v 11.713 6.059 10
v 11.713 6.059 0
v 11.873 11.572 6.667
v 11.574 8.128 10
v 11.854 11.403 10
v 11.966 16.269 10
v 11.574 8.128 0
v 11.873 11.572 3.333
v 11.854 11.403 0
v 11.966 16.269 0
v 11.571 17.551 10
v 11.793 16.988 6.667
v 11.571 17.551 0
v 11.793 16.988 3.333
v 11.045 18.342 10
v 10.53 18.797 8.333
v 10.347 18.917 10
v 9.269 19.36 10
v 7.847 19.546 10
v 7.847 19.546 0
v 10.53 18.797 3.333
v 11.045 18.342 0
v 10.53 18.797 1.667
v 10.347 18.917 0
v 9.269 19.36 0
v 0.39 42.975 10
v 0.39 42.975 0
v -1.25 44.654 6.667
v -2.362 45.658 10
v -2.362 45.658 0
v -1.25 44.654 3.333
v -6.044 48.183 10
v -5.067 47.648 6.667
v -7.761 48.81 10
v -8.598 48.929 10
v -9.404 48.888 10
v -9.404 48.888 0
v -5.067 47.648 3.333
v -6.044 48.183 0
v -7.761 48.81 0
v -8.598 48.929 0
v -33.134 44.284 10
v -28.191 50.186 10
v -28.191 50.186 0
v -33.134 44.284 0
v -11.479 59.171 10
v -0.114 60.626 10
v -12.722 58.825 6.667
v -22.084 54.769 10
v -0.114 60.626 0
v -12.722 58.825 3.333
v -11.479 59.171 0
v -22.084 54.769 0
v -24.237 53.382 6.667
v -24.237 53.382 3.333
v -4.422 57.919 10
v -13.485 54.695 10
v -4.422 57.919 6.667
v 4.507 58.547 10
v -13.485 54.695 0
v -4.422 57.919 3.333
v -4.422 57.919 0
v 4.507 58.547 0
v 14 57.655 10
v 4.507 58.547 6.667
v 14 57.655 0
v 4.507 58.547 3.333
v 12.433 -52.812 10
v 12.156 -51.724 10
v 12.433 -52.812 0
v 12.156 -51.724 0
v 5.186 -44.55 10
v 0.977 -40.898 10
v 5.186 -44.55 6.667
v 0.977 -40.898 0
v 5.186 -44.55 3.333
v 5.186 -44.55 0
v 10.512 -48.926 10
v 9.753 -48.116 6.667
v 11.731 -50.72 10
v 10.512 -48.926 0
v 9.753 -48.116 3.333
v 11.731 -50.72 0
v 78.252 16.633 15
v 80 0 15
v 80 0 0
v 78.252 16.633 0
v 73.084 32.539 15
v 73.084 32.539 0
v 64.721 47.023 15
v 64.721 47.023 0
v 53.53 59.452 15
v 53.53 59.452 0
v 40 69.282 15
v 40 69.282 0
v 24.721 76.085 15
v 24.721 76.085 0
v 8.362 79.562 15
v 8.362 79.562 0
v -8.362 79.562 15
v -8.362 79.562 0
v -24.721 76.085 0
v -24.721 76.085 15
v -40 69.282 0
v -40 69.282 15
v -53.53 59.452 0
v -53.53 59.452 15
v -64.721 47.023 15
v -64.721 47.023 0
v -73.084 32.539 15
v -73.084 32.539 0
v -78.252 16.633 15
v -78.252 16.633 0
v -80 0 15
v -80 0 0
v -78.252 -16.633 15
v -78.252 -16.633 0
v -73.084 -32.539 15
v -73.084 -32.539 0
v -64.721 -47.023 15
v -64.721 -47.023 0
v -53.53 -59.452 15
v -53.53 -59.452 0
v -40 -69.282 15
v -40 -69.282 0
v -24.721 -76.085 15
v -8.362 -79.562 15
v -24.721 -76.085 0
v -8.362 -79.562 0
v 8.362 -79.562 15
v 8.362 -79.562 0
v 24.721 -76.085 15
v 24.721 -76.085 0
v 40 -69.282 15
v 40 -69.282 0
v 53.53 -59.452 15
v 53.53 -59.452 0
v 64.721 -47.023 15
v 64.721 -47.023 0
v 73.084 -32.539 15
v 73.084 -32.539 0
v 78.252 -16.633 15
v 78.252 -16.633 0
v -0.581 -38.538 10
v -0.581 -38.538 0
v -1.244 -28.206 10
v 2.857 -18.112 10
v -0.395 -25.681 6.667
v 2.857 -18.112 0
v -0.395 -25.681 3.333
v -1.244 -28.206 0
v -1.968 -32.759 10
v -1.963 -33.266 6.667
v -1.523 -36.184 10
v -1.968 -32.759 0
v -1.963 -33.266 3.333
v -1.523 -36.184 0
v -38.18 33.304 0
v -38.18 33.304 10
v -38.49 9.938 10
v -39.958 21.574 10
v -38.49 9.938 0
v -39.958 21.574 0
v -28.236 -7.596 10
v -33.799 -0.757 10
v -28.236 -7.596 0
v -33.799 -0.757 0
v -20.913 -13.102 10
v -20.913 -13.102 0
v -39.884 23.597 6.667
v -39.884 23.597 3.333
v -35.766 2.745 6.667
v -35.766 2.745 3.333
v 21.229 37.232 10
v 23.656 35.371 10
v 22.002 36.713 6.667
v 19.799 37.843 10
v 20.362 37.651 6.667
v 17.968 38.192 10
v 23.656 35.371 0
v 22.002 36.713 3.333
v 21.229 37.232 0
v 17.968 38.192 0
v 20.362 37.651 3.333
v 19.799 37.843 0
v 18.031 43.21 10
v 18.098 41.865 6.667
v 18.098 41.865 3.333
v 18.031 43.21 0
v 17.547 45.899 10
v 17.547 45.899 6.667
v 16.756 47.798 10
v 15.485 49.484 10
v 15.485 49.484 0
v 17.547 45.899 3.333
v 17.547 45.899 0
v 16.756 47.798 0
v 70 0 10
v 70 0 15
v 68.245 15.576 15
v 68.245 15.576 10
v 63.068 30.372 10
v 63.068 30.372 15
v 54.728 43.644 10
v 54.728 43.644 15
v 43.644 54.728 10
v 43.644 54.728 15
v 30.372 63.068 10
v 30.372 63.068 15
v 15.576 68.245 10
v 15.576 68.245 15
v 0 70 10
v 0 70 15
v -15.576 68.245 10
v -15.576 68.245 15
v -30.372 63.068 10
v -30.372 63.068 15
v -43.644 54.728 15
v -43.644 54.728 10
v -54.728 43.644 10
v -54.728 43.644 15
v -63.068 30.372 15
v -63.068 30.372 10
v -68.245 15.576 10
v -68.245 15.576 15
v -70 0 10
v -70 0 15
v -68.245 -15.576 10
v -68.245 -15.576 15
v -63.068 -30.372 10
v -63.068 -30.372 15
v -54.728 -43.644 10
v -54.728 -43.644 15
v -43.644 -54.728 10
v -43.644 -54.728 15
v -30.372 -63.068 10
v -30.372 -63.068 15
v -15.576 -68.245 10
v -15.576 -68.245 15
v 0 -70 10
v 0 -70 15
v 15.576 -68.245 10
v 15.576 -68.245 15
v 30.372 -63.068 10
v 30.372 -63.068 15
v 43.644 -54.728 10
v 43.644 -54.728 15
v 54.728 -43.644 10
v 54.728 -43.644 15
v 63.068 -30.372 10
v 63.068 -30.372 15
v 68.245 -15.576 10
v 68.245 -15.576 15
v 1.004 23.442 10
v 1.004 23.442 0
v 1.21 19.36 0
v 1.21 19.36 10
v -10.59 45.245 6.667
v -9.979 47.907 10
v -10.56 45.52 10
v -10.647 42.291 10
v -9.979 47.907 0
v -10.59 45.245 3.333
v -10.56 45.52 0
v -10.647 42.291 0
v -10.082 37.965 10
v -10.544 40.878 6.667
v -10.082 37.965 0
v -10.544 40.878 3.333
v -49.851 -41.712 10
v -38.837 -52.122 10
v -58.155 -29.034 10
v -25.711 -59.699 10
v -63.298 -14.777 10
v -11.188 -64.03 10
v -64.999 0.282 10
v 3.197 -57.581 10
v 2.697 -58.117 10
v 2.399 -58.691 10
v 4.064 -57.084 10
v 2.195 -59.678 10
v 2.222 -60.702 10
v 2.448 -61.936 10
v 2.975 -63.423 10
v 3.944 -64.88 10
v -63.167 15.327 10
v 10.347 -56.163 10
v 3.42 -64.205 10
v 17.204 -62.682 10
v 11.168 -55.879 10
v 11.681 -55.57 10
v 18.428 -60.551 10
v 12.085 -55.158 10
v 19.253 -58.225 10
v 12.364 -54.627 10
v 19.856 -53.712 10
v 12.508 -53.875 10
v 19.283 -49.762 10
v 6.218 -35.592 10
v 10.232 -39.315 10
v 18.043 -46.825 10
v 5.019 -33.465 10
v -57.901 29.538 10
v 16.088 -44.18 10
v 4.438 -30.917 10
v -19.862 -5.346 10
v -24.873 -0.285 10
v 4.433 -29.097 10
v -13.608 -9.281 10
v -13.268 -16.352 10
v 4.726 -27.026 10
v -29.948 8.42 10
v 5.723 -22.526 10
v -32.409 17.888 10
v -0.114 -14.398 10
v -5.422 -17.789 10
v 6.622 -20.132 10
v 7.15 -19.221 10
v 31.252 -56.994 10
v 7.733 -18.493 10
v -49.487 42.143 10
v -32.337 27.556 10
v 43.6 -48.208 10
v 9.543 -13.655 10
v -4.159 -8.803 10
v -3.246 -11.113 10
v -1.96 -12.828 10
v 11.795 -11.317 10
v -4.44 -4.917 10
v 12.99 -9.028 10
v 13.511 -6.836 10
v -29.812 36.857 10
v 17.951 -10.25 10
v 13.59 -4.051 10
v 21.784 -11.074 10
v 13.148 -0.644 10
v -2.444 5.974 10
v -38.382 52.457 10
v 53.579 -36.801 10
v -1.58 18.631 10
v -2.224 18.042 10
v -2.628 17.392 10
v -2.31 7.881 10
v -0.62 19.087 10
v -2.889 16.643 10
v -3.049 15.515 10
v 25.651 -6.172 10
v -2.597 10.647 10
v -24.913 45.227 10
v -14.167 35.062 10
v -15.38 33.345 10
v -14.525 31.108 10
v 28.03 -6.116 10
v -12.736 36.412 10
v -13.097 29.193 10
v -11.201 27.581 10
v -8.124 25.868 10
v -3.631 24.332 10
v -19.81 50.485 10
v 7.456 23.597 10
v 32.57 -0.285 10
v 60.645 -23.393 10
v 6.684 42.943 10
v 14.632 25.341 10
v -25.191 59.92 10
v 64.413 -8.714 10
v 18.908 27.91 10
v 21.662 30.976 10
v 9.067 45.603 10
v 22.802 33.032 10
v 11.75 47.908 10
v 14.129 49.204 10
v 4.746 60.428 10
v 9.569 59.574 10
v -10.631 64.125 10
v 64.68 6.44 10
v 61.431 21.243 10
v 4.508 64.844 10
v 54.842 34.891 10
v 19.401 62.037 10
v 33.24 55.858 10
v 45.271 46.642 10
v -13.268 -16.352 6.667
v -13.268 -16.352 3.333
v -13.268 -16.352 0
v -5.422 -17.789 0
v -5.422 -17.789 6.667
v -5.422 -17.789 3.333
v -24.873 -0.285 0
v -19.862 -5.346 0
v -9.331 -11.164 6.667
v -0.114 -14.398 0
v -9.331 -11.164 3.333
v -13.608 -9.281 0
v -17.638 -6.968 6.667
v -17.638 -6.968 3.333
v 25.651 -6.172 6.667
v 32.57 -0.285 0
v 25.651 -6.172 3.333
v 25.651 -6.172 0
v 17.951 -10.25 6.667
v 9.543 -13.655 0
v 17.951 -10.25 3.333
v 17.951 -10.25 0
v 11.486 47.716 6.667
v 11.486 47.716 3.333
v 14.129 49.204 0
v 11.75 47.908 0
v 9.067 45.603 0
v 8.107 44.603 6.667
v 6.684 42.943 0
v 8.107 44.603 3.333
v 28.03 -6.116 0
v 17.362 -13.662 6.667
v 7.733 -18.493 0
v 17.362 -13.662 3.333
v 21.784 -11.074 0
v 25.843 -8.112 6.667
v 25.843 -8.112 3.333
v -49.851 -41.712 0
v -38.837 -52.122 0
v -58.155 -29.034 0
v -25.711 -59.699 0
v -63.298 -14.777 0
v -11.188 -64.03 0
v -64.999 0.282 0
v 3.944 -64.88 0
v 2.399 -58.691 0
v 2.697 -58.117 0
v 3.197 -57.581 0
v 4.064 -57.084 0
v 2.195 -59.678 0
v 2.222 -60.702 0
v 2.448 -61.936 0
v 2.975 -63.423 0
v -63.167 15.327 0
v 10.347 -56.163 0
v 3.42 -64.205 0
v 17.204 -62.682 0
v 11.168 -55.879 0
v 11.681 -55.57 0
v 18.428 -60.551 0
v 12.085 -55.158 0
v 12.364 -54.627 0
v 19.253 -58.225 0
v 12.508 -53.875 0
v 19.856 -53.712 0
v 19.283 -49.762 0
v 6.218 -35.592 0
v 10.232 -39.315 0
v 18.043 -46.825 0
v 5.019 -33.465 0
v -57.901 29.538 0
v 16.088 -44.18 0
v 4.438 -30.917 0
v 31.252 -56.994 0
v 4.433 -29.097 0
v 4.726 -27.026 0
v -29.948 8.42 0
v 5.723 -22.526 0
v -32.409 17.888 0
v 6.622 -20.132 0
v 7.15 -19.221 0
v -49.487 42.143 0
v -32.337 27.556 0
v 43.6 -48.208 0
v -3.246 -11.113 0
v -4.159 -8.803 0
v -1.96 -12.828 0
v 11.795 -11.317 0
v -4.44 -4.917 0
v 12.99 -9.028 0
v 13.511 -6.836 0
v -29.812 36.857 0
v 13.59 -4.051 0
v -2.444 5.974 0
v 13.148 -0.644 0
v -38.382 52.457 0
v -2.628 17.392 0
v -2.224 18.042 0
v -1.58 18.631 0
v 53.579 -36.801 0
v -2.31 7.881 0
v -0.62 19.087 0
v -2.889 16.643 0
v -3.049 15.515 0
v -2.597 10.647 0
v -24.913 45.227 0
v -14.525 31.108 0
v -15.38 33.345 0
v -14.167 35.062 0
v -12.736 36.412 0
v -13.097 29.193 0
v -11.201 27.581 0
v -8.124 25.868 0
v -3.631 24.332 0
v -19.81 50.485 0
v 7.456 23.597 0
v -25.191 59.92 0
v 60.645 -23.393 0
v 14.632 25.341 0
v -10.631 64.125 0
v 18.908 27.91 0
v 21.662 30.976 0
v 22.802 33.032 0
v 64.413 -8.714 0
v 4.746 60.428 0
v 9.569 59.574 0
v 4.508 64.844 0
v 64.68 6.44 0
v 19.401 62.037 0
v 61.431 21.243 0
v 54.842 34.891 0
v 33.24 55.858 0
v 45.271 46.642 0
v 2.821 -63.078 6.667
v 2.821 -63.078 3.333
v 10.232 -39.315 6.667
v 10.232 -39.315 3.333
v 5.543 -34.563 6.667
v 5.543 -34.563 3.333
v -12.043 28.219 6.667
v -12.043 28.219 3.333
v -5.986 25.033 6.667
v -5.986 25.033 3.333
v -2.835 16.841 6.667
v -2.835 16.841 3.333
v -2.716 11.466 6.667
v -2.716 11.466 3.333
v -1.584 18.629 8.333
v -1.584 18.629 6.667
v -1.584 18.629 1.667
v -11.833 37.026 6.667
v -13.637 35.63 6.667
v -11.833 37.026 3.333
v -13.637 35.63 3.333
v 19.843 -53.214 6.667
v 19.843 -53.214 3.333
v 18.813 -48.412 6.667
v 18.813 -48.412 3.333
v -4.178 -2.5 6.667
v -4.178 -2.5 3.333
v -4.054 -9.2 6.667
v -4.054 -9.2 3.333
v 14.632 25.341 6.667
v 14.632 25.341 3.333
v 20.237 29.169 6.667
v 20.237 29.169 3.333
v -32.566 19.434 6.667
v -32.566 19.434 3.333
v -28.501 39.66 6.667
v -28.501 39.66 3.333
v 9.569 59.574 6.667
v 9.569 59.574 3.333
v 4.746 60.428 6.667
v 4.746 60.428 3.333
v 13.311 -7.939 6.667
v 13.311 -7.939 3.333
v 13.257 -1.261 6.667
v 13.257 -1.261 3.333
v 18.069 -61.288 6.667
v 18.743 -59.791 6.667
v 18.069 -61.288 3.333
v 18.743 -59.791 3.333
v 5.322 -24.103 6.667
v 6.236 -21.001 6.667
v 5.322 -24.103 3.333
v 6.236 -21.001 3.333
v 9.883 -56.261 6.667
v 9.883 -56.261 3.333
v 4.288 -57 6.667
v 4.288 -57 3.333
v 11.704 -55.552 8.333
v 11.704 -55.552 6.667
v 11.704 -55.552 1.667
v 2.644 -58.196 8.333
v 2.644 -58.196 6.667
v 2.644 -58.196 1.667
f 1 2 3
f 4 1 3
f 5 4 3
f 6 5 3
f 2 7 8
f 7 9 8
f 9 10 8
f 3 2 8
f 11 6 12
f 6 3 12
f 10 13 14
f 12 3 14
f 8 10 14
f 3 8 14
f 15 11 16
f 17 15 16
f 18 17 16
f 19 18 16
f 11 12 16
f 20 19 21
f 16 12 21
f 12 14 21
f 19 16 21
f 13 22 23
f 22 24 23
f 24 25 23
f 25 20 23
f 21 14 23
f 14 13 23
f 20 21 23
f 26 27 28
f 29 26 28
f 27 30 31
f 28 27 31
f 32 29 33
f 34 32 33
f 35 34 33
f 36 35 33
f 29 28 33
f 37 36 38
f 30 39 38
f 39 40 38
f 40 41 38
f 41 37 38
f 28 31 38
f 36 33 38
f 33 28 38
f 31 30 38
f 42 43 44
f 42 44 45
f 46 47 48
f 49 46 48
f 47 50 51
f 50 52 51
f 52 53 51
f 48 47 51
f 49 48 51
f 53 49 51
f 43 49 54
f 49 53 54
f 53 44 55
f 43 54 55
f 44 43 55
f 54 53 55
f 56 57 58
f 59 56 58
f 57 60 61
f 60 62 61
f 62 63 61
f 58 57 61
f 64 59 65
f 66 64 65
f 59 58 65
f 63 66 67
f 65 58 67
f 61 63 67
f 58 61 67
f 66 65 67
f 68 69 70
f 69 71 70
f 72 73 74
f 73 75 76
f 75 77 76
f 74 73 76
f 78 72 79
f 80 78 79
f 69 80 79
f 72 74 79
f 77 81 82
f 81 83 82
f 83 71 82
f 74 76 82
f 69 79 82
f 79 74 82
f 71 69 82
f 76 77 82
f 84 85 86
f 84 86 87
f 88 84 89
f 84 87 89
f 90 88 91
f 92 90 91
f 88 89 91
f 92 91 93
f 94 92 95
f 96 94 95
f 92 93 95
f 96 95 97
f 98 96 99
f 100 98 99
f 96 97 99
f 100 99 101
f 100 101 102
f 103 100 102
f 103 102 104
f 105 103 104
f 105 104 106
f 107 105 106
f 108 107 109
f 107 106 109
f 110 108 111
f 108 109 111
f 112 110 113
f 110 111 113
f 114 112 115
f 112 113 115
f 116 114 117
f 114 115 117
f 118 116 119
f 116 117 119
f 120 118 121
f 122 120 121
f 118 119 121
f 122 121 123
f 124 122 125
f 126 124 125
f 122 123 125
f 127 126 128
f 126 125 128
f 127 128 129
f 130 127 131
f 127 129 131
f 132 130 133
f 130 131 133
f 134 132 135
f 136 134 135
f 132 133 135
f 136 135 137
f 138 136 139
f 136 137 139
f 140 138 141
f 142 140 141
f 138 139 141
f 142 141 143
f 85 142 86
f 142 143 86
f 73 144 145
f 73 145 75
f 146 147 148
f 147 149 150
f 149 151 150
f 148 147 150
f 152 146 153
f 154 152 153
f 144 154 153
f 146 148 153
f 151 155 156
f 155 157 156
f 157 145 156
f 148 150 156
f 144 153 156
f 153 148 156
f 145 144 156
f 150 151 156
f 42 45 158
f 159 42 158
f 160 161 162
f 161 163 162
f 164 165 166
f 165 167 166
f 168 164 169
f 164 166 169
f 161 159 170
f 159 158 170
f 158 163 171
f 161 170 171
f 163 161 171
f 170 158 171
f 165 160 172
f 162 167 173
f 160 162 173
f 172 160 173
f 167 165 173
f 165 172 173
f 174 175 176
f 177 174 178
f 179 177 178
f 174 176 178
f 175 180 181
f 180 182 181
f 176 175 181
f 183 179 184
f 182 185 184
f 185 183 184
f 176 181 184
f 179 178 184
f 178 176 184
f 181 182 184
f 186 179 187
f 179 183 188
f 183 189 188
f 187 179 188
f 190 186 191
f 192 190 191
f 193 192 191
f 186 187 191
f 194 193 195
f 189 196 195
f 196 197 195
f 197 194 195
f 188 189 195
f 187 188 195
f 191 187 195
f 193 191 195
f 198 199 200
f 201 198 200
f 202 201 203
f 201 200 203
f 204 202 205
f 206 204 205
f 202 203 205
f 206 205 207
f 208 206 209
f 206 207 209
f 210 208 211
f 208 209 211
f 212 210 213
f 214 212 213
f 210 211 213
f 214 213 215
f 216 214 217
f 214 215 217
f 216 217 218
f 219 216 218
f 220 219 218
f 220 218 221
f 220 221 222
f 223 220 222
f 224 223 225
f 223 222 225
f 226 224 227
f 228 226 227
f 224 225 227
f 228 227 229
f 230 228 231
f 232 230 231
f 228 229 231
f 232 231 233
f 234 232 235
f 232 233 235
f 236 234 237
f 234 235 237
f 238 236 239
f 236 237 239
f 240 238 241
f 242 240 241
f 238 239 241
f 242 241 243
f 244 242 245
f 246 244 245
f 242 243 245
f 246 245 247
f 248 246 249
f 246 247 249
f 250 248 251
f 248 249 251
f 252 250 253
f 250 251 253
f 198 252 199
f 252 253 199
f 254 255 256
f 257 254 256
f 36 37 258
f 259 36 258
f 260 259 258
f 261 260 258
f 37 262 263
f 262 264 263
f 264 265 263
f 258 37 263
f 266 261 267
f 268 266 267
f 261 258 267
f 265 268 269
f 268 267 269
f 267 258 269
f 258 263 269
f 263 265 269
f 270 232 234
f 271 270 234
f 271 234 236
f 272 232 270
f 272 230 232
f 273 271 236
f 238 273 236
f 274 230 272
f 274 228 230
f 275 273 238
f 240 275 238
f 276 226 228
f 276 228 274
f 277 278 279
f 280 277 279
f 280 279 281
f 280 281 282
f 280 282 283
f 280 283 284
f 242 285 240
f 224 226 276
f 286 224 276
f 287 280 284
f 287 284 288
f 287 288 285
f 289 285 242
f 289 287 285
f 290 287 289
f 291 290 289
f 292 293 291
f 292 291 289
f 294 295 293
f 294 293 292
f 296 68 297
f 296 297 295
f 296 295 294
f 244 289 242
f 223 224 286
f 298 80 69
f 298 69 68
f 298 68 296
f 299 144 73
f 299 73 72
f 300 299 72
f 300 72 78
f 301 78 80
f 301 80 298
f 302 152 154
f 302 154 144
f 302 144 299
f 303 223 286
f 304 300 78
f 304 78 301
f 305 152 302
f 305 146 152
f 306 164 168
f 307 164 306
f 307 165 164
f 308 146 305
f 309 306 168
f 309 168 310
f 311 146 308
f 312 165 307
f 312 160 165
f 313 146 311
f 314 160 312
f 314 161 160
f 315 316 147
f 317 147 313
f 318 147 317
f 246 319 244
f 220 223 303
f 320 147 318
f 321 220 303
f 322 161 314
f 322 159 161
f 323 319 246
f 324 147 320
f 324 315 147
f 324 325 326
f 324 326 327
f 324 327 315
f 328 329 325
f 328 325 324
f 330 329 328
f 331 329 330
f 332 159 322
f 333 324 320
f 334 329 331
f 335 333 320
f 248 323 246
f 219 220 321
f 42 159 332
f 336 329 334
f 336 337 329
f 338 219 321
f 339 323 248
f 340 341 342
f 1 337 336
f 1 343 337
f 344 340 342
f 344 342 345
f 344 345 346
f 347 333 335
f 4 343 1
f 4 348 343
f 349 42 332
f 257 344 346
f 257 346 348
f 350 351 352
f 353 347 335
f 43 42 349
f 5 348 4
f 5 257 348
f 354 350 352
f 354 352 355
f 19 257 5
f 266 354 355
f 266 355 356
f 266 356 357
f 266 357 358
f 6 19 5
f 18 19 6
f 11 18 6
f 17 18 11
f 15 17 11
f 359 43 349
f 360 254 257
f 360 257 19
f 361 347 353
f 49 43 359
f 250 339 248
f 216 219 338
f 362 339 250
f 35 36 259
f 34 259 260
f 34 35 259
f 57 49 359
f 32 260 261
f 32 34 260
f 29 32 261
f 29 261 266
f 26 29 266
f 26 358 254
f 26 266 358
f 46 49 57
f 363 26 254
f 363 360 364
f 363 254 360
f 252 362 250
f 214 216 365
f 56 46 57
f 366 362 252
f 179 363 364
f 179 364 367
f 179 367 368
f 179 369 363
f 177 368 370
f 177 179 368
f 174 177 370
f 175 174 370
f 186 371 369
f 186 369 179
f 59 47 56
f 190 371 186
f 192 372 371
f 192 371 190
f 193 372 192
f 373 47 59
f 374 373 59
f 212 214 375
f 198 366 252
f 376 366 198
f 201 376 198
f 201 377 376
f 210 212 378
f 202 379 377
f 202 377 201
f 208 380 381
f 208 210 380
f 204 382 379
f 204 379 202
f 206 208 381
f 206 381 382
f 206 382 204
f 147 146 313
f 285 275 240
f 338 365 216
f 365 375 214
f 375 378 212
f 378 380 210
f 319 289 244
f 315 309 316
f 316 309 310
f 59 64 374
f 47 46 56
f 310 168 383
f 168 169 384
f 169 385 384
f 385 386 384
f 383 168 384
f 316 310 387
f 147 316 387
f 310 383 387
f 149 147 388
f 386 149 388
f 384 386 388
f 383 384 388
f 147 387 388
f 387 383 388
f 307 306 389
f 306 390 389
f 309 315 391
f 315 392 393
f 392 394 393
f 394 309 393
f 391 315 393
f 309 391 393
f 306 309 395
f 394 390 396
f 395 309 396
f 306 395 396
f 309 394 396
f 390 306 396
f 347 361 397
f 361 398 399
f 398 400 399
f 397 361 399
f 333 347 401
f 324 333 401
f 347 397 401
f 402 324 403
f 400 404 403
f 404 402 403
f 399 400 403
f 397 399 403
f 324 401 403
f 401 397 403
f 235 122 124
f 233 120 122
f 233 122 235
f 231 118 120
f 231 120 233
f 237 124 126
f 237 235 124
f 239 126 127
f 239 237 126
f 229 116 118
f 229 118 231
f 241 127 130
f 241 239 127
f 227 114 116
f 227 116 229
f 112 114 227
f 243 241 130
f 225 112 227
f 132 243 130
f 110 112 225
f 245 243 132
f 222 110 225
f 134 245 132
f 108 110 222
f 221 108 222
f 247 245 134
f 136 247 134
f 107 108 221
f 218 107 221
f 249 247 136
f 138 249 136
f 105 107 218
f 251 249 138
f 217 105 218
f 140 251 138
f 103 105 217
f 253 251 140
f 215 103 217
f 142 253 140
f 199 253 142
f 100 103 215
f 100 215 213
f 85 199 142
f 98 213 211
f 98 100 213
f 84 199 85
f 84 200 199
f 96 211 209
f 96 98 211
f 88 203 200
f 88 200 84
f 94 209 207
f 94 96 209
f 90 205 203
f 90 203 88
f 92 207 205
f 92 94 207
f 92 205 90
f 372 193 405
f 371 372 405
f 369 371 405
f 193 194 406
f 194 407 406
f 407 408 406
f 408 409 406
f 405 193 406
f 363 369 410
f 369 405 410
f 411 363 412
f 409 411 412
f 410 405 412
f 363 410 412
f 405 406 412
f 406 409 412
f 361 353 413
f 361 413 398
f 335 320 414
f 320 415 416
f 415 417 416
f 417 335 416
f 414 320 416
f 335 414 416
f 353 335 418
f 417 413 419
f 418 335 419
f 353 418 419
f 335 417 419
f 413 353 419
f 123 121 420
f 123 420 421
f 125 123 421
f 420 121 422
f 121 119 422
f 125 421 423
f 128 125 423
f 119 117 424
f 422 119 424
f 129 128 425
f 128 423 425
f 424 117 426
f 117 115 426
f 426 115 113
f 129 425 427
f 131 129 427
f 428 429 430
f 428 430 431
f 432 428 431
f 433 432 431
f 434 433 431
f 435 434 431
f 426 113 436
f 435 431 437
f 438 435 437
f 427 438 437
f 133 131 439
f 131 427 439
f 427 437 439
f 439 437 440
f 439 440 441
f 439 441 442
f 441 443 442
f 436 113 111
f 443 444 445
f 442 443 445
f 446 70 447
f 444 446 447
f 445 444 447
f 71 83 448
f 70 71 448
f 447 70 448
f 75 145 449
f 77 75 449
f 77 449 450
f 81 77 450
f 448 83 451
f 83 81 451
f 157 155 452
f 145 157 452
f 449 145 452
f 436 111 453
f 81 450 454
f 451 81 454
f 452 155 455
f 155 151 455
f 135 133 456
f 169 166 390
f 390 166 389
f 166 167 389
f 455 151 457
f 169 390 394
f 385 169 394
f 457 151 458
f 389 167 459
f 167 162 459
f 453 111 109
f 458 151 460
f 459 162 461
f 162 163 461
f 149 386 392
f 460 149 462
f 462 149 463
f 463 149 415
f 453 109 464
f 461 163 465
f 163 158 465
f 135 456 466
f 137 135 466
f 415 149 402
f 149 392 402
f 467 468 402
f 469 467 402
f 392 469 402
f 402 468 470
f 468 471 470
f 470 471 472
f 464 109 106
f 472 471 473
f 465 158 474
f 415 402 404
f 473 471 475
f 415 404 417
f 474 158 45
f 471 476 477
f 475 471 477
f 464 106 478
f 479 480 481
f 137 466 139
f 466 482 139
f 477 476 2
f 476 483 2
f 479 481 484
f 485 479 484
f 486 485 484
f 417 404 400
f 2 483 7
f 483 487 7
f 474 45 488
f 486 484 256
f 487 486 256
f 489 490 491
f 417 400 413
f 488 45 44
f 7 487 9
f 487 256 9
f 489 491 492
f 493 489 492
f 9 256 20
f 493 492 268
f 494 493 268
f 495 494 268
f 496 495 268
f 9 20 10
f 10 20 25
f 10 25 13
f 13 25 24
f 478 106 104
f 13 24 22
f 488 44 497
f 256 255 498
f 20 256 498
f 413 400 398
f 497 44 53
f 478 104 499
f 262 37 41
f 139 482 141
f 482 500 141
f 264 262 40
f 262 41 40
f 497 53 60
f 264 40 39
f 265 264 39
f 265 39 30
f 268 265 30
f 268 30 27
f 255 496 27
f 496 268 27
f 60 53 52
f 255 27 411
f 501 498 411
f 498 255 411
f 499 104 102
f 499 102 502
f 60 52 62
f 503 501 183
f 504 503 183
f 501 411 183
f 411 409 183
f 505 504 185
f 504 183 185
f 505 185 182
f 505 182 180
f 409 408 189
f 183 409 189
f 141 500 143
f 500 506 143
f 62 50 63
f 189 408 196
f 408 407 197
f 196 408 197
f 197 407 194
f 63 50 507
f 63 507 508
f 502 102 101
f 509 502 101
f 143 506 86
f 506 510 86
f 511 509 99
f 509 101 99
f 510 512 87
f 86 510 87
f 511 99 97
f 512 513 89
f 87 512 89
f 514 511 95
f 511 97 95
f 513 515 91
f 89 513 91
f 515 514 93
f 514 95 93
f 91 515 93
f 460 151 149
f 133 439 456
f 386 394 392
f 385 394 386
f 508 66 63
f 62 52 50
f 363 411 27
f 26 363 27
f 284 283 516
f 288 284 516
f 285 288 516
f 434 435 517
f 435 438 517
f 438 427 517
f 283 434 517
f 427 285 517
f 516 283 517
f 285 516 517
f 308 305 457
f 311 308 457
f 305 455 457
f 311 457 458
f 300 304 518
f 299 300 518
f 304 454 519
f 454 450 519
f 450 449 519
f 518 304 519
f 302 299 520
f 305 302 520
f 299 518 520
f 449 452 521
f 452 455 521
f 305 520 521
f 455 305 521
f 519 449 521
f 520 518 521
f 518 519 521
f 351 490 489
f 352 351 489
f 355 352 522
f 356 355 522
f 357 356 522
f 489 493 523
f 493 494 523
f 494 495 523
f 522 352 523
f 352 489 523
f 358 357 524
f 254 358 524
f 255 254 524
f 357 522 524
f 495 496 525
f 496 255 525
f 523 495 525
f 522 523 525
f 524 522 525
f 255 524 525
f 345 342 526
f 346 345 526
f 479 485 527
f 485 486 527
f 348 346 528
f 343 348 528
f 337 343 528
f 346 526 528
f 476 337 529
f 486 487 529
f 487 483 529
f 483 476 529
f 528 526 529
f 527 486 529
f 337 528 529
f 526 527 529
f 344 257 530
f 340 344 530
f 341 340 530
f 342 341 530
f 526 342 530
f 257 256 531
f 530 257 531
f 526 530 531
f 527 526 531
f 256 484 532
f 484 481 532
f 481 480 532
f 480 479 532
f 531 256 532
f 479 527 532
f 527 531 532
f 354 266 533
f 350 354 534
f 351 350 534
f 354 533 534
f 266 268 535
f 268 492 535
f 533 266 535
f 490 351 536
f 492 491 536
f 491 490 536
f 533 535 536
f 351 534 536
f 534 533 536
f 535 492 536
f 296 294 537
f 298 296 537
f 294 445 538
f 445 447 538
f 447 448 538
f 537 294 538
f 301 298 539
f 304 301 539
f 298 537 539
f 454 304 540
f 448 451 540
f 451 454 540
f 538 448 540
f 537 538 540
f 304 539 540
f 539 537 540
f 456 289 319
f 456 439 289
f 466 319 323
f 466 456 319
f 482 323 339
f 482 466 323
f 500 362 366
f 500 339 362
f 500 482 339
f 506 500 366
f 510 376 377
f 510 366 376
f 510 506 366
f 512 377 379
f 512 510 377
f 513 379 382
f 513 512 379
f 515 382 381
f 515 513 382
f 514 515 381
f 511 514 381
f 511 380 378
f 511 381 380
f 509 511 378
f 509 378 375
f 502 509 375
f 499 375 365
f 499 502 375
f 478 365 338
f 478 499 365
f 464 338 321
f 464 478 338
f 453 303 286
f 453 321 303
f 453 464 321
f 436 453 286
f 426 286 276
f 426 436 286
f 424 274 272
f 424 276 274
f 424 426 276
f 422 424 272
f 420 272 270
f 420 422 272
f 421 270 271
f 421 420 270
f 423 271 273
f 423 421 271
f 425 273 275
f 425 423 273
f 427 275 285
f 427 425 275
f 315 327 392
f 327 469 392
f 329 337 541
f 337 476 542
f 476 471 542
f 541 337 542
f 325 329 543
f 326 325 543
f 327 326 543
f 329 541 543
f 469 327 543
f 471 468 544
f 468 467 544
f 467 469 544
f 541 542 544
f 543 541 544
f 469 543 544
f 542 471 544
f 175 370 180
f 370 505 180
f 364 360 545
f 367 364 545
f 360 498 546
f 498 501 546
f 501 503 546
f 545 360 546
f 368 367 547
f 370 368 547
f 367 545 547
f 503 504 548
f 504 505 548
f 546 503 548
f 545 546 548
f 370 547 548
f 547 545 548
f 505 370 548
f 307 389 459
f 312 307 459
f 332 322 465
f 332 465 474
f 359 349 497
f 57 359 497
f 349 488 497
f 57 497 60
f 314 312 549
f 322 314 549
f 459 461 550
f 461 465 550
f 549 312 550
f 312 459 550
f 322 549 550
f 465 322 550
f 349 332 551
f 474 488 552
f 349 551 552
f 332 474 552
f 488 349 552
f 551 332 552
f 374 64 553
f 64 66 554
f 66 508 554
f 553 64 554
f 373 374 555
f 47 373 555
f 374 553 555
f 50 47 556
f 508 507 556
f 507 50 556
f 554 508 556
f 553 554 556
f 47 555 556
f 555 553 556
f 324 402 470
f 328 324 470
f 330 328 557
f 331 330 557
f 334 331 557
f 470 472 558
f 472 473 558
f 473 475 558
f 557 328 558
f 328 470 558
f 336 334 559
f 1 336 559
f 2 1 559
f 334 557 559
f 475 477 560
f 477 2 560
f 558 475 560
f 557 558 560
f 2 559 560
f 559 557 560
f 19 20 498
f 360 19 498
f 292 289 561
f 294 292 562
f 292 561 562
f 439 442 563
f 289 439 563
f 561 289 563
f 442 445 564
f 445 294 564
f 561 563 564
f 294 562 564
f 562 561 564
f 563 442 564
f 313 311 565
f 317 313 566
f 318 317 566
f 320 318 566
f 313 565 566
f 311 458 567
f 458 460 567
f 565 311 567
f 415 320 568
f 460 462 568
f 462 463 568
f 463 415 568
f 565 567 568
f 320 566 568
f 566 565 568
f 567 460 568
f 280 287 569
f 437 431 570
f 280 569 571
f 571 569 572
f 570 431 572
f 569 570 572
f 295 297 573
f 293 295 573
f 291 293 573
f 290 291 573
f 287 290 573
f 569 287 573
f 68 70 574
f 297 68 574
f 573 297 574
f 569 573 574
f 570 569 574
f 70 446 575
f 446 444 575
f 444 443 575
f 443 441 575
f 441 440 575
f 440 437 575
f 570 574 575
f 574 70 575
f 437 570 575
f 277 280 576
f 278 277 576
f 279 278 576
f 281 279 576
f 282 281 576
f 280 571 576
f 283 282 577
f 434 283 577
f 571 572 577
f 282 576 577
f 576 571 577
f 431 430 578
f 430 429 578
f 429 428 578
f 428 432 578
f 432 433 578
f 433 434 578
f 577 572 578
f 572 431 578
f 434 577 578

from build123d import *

# Parameters (mm, degrees)
PAD002_DEPTH  = 10
SKETCH_R      = 80
SKETCH_R_2    = 65
PAD_DEPTH     = 15
SKETCH001_R   = 70
SKETCH001_R_2 = 65
POCKET_DEPTH  = 5


with BuildPart() as design005:
    # Sketch004 → Pad002 (new body)
    with BuildSketch(Plane.XY):
        with BuildLine():
            add(Edge.make_bspline(
                [(2.857443, -18.112357), (-0.294933, -25.68391), (-5.159351, -33.231682), (0.976613, -40.898296)],
                knots=[0, 0, 0, 0, 1, 1, 1, 1], degree=3))
            add(Edge.make_bspline(
                [(0.976613, -40.898296), (4.258386, -44.998653), (11.444412, -47.145409), (12.433102, -52.81238)],
                knots=[0, 0, 0, 0, 1, 1, 1, 1], degree=3))
            add(Edge.make_bspline(
                [(12.433102, -52.81238), (13.672867, -59.918926), (0.142448, -52.599291), (2.448137, -61.936397)],
                knots=[0, 0, 0, 0, 1, 1, 1, 1], degree=3))
            add(Edge.make_bspline(
                [(2.448137, -61.936397), (4.168518, -68.902567), (12.92857, -67.682118), (16.678326, -63.34405)],
                knots=[0, 0, 0, 0, 1, 1, 1, 1], degree=3))
            add(Edge.make_bspline(
                [(16.678326, -63.34405), (17.9515, -61.871038), (18.73965, -60.086786), (19.252918, -58.224542)],
                knots=[0, 0, 0, 0, 1, 1, 1, 1], degree=3))
            add(Edge.make_bspline(
                [(19.252918, -58.224542), (20.62938, -53.230586), (19.684515, -48.0056), (16.087768, -44.18007)],
                knots=[0, 0, 0, 0, 1, 1, 1, 1], degree=3))
            add(Edge.make_bspline(
                [(16.087768, -44.18007), (10.550813, -38.291025), (2.704434, -36.922733), (4.725639, -27.026176)],
                knots=[0, 0, 0, 0, 1, 1, 1, 1], degree=3))
            add(Edge.make_bspline(
                [(4.725639, -27.026176), (5.25154, -24.448609), (5.856192, -20.447778), (7.733288, -18.49342)],
                knots=[0, 0, 0, 0, 1, 1, 1, 1], degree=3))
            add(Edge.make_bspline(
                [(7.733288, -18.49342), (17.735996, -13.502495), (26.919785, -9.769163), (32.570163, -0.28472)],
                knots=[0, 0, 0, 0, 1, 1, 1, 1], degree=3))
            add(Edge.make_bspline(
                [(32.570163, -0.28472), (26.066248, -7.456006), (18.281606, -10.206067), (9.542807, -13.655448)],
                knots=[0, 0, 0, 0, 1, 1, 1, 1], degree=3))
            add(Edge.make_bspline(
                [(9.542807, -13.655448), (16.000679, -8.525608), (13.223554, -1.474567), (11.713483, 6.058606)],
                knots=[0, 0, 0, 0, 1, 1, 1, 1], degree=3))
            add(Edge.make_bspline(
                [(11.713483, 6.058606), (10.782881, 10.701008), (14.934643, 19.337951), (7.8473, 19.546155)],
                knots=[0, 0, 0, 0, 1, 1, 1, 1], degree=3))
            add(Edge.make_bspline(
                [(7.8473, 19.546155), (7.456159, 23.596735)],
                knots=[0, 0, 1.449481, 1.449481], degree=1))
            add(Edge.make_bspline(
                [(7.456159, 23.596735), (15.213484, 24.396732), (21.533452, 27.885447), (23.656316, 35.370556)],
                knots=[0, 0, 0, 0, 1, 1, 1, 1], degree=3))
            add(Edge.make_bspline(
                [(23.656316, 35.370556), (21.738877, 36.918556), (20.996124, 37.847166), (17.967643, 38.191674)],
                knots=[0, 0, 0, 0, 1, 1, 1, 1], degree=3))
            add(Edge.make_bspline(
                [(17.967643, 38.191674), (18.163326, 41.416764), (18.577573, 46.391209), (15.485334, 49.484093)],
                knots=[0, 0, 0, 0, 1, 1, 1, 1], degree=3))
            add(Edge.make_bspline(
                [(15.485334, 49.484093), (11.619572, 49.321819), (6.684433, 42.943063), (6.684433, 42.943063)],
                knots=[0, 0, 0, 0, 1, 1, 1, 1], degree=3))
            add(Edge.make_bspline(
                [(6.684433, 42.943063), (0.389929, 42.975068)],
                knots=[0, 0, 2.242059, 2.242059], degree=1))
            add(Edge.make_bspline(
                [(0.389929, 42.975068), (0.389929, 42.975068), (-5.357645, 49.546785), (-9.404462, 48.888341)],
                knots=[0, 0, 0, 0, 1, 1, 1, 1], degree=3))
            add(Edge.make_bspline(
                [(-9.404462, 48.888341), (-11.478785, 46.3327), (-10.479708, 39.424645), (-10.082306, 37.964604)],
                knots=[0, 0, 0, 0, 1, 1, 1, 1], degree=3))
            add(Edge.make_bspline(
                [(-10.082306, 37.964604), (-11.769249, 37.110168), (-13.705696, 36.218281), (-15.379613, 33.344635)],
                knots=[0, 0, 0, 0, 1, 1, 1, 1], degree=3))
            add(Edge.make_bspline(
                [(-15.379613, 33.344635), (-14.000933, 27.134412), (-5.854881, 24.350493), (1.003565, 23.442238)],
                knots=[0, 0, 0, 0, 1, 1, 1, 1], degree=3))
            add(Edge.make_bspline(
                [(1.003565, 23.442238), (1.210197, 19.360017)],
                knots=[0, 0, 1.455902, 1.455902], degree=1))
            add(Edge.make_bspline(
                [(1.210197, 19.360017), (-6.253659, 19.181741), (-1.456845, 10.612599), (-2.443795, 5.974016)],
                knots=[0, 0, 0, 0, 1, 1, 1, 1], degree=3))
            add(Edge.make_bspline(
                [(-2.443795, 5.974016), (-4.454668, -3.477046), (-6.614086, -9.8608), (-0.113933, -14.398285)],
                knots=[0, 0, 0, 0, 1, 1, 1, 1], degree=3))
            add(Edge.make_bspline(
                [(-0.113933, -14.398285), (-9.732856, -11.135827), (-18.226675, -8.719438), (-24.872819, -0.284748)],
                knots=[0, 0, 0, 0, 1, 1, 1, 1], degree=3))
            add(Edge.make_bspline(
                [(-24.872819, -0.284748), (-38.713975, 17.282017), (-33.70723, 44.153601), (-13.484661, 54.695238)],
                knots=[0, 0, 0, 0, 1, 1, 1, 1], degree=3))
            add(Edge.make_bspline(
                [(-13.484661, 54.695238), (-4.122569, 59.575547), (3.993106, 58.947368), (13.999604, 57.655075)],
                knots=[0, 0, 0, 0, 1, 1, 1, 1], degree=3))
            add(Edge.make_bspline(
                [(13.999604, 57.655075), (9.88215, 60.2423), (4.647534, 60.620555), (-0.113933, 60.626339)],
                knots=[0, 0, 0, 0, 1, 1, 1, 1], degree=3))
            add(Edge.make_bspline(
                [(-0.113933, 60.626339), (-12.760213, 60.643184), (-26.055459, 55.212155), (-33.133851, 44.284347)],
                knots=[0, 0, 0, 0, 1, 1, 1, 1], degree=3))
            add(Edge.make_bspline(
                [(-33.133851, 44.284347), (-45.363462, 25.403755), (-41.088394, -1.481951), (-20.912857, -13.102089)],
                knots=[0, 0, 0, 0, 1, 1, 1, 1], degree=3))
            add(Edge.make_bspline(
                [(-20.912857, -13.102089), (-13.292123, -17.490636), (-5.714956, -18.112386), (2.857331, -18.112386)],
                knots=[0, 0, 0, 0, 1, 1, 1, 1], degree=3))
            add(Edge.make_bspline(
                [(2.857331, -18.112386), (2.857443, -18.112357)],
                knots=[0, 0, 4.1e-05, 4.1e-05], degree=1))
        make_face()
    extrude(amount=PAD002_DEPTH)


with BuildPart() as half_lamp_with_design:
    # Sketch → Pad (new body)
    with BuildSketch(Plane.XY):
        Circle(SKETCH_R)
        Circle(SKETCH_R_2, mode=Mode.SUBTRACT)
    extrude(amount=PAD_DEPTH)

    # Sketch001 (on Face4 of Pad) → Pocket (cut)
    with BuildSketch(Plane.XY.offset(15)):
        Circle(SKETCH001_R)
        Circle(SKETCH001_R_2, mode=Mode.SUBTRACT)
    extrude(amount=-POCKET_DEPTH, mode=Mode.SUBTRACT)

    # Boolean: union design005
    add(design005.part)


solid = half_lamp_with_design.part
